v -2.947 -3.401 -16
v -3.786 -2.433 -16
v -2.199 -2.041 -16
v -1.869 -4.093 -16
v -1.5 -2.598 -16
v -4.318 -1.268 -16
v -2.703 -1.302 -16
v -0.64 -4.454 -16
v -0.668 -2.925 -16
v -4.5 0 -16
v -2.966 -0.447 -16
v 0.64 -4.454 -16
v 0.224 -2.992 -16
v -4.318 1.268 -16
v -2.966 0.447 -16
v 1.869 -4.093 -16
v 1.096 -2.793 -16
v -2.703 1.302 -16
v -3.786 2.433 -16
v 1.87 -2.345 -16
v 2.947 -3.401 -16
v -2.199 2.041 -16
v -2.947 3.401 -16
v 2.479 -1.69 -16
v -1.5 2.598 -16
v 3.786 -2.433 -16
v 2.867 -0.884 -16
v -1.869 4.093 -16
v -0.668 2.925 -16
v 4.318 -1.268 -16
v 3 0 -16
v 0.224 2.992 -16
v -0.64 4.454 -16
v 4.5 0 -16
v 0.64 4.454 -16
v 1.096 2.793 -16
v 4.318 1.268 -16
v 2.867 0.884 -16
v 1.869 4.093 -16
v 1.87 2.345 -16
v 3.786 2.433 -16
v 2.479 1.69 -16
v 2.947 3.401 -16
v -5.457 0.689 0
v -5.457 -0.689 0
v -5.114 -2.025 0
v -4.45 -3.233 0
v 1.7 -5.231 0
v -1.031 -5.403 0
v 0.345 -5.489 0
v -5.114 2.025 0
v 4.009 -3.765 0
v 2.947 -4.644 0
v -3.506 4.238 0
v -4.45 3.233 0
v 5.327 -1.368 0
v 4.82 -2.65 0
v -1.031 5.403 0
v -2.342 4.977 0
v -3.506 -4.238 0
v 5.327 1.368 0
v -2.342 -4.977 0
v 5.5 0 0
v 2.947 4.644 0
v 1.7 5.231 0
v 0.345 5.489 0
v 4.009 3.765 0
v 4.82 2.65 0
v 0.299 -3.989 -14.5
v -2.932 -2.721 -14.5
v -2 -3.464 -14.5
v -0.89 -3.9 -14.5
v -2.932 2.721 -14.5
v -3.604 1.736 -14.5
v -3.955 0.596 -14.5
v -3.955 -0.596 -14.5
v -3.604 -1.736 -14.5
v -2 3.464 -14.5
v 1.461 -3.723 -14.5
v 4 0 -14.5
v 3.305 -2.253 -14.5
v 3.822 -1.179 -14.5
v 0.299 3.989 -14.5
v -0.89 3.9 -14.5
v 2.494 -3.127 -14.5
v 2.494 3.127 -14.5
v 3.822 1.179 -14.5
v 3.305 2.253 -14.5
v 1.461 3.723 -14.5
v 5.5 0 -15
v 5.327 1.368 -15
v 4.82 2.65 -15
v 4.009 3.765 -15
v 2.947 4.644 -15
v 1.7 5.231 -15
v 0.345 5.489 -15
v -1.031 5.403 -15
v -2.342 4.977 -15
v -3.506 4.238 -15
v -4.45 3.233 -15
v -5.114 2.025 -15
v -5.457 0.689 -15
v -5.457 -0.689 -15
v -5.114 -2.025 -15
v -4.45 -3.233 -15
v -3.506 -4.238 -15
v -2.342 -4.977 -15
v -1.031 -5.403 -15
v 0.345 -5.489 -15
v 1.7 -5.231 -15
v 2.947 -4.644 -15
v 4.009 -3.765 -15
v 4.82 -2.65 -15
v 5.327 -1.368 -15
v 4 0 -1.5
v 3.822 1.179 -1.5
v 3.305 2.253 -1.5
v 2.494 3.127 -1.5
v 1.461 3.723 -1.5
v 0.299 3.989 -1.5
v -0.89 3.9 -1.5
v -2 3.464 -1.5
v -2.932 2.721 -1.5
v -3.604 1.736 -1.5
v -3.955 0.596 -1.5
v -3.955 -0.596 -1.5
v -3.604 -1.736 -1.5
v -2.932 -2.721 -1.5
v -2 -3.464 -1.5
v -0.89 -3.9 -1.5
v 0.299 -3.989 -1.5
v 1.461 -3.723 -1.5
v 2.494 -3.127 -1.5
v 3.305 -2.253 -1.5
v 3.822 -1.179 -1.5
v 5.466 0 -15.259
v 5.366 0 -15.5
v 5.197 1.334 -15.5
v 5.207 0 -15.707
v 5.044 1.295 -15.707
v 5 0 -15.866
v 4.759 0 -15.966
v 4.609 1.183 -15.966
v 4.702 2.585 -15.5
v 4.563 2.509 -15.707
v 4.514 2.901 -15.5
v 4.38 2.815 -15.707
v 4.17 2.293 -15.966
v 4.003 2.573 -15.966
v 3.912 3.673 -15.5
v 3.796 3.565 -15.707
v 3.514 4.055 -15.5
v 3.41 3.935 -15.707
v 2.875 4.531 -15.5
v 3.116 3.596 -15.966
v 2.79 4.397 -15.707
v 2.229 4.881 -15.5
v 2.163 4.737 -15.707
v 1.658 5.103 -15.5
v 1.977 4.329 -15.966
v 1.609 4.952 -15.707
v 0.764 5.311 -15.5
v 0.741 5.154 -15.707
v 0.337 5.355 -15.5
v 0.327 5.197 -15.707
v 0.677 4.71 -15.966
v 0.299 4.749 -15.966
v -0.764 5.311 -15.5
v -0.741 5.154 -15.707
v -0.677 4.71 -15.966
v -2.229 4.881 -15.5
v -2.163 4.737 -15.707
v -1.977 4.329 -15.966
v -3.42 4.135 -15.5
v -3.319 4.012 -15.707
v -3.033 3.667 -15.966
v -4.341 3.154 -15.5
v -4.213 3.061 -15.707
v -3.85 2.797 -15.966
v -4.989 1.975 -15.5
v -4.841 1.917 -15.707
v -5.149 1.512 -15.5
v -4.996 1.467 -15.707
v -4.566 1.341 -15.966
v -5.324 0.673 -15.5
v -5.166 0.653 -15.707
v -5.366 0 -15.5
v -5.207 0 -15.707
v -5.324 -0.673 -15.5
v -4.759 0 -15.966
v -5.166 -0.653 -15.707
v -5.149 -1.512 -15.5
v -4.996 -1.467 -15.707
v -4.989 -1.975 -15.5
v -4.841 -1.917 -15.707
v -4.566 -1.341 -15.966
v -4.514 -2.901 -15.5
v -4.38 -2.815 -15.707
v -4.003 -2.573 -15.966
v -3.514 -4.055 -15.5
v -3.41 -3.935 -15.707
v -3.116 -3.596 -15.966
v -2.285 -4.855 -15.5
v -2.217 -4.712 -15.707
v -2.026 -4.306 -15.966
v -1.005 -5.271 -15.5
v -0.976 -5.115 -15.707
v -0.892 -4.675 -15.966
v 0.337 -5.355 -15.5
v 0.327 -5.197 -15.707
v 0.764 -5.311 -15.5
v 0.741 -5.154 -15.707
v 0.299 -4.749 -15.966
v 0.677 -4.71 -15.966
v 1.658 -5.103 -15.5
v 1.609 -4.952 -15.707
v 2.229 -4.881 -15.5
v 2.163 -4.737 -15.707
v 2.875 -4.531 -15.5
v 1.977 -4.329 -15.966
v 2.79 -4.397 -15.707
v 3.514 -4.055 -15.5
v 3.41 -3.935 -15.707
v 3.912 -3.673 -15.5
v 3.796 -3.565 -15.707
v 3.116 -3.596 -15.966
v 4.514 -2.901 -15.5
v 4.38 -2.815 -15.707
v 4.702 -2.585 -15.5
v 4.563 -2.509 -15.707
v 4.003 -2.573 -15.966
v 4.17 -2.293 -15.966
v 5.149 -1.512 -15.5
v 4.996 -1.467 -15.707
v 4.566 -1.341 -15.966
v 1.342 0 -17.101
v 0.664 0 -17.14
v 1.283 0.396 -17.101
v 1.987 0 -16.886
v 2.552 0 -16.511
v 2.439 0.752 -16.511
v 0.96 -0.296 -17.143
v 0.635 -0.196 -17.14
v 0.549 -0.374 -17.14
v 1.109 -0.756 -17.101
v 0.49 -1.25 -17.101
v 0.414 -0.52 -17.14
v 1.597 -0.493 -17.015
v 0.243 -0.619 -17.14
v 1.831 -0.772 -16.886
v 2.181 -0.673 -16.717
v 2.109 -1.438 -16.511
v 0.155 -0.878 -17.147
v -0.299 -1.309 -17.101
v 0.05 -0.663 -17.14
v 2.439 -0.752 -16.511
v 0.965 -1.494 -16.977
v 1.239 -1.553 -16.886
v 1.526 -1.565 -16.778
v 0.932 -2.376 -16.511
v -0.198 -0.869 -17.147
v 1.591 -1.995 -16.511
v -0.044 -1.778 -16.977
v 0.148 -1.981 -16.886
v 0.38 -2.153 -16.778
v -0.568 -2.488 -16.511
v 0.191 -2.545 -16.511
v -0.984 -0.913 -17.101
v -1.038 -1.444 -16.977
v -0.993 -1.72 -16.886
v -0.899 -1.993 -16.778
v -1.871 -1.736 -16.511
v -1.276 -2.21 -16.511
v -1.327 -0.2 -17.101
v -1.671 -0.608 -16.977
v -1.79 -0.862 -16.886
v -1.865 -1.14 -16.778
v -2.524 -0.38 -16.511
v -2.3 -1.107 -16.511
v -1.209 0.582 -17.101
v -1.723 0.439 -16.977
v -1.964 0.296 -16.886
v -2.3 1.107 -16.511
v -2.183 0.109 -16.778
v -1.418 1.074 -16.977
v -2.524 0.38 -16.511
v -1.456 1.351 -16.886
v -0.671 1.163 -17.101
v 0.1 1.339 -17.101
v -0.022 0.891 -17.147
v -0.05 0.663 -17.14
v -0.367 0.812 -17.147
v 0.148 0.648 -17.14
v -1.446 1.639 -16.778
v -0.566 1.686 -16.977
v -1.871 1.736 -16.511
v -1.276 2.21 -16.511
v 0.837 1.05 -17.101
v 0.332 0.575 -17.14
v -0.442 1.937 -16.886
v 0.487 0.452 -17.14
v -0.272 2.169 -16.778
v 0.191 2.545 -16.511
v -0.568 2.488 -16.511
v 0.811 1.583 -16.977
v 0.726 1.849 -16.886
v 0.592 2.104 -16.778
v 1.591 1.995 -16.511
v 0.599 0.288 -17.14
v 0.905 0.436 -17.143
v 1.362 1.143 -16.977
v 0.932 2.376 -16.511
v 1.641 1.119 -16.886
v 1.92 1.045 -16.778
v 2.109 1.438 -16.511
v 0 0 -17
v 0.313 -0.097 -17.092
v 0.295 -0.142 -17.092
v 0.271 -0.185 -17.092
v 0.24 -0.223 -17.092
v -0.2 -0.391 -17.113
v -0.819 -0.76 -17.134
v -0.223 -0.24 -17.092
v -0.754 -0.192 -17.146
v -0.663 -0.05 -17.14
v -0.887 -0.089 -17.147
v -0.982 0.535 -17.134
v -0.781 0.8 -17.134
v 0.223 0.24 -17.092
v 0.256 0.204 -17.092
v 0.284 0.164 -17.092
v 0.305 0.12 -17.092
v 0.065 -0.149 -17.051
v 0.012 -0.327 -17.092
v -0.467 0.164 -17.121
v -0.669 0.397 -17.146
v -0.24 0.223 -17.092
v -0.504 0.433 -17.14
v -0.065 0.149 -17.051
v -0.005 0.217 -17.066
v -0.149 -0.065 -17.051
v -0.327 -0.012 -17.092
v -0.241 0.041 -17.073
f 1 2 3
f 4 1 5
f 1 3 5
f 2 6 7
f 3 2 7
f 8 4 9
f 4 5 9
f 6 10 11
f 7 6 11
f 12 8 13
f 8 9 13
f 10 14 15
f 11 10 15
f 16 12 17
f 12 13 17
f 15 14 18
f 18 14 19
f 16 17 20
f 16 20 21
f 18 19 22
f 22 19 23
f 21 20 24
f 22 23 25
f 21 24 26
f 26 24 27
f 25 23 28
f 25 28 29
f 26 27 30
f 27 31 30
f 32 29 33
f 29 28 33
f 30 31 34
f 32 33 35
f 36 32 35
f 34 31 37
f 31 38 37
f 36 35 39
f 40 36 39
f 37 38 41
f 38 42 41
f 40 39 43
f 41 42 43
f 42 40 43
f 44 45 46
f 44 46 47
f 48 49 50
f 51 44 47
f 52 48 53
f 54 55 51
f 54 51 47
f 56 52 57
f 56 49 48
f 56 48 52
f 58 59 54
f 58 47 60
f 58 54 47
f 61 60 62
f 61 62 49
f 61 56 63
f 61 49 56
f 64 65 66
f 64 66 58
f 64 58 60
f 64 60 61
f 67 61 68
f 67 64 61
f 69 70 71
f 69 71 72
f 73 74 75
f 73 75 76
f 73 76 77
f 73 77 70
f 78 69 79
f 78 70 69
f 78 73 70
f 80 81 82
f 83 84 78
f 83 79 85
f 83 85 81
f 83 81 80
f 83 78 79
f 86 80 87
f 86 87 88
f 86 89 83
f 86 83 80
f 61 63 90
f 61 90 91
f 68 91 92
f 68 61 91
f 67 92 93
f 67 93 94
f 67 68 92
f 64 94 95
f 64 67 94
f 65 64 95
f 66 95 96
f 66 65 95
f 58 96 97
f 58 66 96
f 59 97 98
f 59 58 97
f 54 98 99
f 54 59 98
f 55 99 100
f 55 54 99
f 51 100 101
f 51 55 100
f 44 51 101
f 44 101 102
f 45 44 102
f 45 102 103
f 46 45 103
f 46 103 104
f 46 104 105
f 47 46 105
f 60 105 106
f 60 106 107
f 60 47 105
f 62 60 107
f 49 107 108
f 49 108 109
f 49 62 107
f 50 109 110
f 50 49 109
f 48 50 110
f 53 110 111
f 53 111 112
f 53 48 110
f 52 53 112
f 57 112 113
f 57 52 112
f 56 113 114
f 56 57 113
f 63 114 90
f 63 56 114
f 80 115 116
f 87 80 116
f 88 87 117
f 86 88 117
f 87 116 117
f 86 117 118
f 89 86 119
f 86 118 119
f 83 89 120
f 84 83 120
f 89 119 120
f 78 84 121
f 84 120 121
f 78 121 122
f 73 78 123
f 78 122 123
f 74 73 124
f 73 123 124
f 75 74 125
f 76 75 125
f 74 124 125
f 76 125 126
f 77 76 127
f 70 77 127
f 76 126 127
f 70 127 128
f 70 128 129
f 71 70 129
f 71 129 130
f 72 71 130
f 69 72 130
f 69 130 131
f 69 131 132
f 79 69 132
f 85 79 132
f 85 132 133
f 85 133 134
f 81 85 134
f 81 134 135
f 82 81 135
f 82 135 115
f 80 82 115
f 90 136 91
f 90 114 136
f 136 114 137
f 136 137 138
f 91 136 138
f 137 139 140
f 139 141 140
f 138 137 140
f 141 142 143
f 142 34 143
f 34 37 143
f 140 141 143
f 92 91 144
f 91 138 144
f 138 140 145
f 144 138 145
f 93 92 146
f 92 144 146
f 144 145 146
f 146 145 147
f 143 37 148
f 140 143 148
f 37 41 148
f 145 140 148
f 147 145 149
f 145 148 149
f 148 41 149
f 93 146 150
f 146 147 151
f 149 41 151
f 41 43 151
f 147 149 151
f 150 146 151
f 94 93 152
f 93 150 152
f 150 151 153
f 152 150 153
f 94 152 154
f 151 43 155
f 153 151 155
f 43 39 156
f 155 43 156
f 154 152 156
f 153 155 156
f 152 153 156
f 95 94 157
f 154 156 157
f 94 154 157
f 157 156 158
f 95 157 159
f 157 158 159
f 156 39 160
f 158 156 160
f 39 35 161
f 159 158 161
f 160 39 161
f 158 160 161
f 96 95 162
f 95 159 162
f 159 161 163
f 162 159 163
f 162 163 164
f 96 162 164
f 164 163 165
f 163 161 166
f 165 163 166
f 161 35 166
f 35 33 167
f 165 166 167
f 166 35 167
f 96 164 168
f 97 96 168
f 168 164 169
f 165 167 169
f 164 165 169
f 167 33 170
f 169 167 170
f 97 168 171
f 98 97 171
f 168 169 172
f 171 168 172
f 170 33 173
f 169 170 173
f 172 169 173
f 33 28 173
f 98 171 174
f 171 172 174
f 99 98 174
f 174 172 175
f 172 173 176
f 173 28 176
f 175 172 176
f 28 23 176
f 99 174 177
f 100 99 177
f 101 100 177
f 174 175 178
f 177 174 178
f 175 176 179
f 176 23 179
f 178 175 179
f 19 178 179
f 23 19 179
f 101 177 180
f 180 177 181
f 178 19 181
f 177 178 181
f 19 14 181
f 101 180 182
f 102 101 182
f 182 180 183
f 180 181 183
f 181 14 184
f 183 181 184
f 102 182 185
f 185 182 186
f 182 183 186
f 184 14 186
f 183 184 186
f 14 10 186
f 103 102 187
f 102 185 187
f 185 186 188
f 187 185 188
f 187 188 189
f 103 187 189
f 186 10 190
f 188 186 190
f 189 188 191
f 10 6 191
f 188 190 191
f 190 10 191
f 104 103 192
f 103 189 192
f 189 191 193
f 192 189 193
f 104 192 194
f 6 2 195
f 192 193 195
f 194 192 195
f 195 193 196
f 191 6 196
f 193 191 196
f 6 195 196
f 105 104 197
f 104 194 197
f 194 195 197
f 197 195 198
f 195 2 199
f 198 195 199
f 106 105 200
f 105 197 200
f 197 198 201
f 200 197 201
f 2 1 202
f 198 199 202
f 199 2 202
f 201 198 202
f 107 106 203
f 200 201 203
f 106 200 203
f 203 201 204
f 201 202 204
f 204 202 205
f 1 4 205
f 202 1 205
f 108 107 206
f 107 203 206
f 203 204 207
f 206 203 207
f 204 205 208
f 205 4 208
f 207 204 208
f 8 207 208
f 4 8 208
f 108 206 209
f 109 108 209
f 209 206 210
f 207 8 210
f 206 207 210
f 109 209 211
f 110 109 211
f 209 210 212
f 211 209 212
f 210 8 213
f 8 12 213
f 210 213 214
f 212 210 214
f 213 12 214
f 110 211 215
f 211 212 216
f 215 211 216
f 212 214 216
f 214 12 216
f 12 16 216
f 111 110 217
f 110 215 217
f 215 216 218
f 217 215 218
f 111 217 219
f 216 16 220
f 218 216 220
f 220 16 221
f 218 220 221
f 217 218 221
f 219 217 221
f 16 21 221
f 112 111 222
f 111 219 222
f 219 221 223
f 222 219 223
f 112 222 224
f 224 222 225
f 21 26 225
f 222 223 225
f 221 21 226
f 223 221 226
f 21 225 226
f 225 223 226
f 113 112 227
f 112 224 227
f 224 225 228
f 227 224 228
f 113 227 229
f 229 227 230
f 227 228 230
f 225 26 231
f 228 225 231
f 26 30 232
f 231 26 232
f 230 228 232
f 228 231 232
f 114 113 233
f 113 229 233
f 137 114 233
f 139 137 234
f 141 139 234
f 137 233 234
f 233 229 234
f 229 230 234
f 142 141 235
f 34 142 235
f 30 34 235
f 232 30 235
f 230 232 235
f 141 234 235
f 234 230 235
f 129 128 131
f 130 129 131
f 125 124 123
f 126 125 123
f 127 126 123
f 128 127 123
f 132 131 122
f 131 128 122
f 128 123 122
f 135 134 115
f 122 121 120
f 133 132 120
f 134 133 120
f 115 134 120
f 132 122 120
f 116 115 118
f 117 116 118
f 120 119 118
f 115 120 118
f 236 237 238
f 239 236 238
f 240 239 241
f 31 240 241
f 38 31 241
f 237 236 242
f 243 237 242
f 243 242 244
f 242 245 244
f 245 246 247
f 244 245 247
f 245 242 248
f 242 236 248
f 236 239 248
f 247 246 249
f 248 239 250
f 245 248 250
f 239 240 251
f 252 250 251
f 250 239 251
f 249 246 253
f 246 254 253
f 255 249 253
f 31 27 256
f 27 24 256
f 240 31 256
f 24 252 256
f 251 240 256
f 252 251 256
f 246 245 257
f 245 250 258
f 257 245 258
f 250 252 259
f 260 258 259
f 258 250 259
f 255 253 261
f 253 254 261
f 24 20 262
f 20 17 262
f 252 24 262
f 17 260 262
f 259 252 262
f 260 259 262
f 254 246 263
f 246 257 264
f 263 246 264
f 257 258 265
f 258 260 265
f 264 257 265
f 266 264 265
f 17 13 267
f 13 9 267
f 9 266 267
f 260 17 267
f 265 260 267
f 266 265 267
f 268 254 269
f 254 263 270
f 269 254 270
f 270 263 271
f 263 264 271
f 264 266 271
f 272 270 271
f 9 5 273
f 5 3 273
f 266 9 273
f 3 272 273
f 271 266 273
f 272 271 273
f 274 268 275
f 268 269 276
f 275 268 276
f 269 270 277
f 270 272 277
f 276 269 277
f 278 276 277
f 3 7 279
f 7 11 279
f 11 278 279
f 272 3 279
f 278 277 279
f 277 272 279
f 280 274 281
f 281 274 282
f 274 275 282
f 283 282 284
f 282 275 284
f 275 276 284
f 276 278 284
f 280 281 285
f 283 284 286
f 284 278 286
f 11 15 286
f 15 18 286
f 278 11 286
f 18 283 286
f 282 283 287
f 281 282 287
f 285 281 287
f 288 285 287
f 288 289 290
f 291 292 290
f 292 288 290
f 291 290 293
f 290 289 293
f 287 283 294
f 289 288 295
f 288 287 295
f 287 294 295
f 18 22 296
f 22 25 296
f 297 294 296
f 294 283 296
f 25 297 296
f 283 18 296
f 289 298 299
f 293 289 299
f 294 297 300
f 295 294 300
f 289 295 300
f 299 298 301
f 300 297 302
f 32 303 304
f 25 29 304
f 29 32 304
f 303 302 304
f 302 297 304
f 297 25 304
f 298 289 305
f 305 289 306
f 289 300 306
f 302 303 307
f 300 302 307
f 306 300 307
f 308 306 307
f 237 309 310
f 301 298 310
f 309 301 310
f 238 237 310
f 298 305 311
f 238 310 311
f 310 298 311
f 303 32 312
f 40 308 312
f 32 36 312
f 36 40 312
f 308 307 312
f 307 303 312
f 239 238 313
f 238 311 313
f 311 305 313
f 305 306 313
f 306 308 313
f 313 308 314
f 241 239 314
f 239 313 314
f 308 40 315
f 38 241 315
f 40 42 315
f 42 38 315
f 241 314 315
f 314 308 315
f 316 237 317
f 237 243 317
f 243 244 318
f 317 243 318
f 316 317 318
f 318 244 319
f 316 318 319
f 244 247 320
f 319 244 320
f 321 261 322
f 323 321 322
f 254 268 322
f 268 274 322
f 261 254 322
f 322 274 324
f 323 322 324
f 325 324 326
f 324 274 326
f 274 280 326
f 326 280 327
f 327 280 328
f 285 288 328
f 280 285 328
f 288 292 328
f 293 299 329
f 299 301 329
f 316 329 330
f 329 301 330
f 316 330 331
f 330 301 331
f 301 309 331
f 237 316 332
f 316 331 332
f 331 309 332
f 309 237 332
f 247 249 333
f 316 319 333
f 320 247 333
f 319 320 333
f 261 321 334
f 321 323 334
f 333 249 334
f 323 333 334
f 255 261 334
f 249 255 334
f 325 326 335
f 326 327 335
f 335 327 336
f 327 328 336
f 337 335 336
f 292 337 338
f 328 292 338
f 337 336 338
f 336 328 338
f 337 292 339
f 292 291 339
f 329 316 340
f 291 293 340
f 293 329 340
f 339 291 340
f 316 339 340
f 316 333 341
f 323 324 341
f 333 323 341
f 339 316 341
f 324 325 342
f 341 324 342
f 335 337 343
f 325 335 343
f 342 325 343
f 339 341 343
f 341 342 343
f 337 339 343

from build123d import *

# Parameters (mm, degrees)
F0_R     = 5.5
F1_DEPTH = 16
F2_R     = 1
F3_T     = -1.5


with BuildPart() as f1:
    # F0 (on Top) → F1 (new body)
    with BuildSketch(Plane.XY):
        Circle(F0_R)
    extrude(amount=-F1_DEPTH)

    # F2
    f2_edges = [f1.edges().sort_by_distance(p)[0] for p in [
        (-5.5, 0, -16),
    ]]
    fillet(f2_edges, radius=F2_R)

    # F3 (hollow: no face is removed)
    offset(amount=F3_T, mode=Mode.SUBTRACT)

    # F4 (on Front) → F5 (revolve)
    with BuildSketch(Plane.XZ):
        with BuildLine():
            Line((3, -16), (0, -16))
            Line((0, -16), (0, -17))
            ThreePointArc((0, -17), (1.6716371784, -17.0149115353), (3, -16))
        make_face()
    revolve(axis=Axis((0, 0, -16.5), (0, 0, -1)))


solid = f1.part
